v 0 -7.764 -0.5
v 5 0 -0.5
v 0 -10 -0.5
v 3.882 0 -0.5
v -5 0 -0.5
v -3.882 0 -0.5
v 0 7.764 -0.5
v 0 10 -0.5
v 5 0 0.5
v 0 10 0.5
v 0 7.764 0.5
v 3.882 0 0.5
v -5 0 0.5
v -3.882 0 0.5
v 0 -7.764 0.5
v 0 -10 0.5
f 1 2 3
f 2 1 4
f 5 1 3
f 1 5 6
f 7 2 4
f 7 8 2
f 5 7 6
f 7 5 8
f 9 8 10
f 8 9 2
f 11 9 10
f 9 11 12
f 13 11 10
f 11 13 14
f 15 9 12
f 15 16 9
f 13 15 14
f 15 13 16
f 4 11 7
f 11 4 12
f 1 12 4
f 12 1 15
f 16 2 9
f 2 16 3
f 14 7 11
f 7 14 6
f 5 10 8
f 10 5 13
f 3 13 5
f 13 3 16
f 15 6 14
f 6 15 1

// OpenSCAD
l = 20;
w = 10;
d = 1;
a = atan(w/l);
dy = d / sin(a);
dx = d / cos(a);

P = [[0, l/2], [w/2, 0], [w/2-dx, 0], [0, l/2-dy]];

module onepiece() 
{
    linear_extrude(height = d, center = true, convexity = 10)
    polygon(P, convexity = 3);
}

onepiece();
mirror([0,1,0]) onepiece();
mirror([1,0,0]) onepiece();
mirror([0,1,0]) mirror([1,0,0]) onepiece();
